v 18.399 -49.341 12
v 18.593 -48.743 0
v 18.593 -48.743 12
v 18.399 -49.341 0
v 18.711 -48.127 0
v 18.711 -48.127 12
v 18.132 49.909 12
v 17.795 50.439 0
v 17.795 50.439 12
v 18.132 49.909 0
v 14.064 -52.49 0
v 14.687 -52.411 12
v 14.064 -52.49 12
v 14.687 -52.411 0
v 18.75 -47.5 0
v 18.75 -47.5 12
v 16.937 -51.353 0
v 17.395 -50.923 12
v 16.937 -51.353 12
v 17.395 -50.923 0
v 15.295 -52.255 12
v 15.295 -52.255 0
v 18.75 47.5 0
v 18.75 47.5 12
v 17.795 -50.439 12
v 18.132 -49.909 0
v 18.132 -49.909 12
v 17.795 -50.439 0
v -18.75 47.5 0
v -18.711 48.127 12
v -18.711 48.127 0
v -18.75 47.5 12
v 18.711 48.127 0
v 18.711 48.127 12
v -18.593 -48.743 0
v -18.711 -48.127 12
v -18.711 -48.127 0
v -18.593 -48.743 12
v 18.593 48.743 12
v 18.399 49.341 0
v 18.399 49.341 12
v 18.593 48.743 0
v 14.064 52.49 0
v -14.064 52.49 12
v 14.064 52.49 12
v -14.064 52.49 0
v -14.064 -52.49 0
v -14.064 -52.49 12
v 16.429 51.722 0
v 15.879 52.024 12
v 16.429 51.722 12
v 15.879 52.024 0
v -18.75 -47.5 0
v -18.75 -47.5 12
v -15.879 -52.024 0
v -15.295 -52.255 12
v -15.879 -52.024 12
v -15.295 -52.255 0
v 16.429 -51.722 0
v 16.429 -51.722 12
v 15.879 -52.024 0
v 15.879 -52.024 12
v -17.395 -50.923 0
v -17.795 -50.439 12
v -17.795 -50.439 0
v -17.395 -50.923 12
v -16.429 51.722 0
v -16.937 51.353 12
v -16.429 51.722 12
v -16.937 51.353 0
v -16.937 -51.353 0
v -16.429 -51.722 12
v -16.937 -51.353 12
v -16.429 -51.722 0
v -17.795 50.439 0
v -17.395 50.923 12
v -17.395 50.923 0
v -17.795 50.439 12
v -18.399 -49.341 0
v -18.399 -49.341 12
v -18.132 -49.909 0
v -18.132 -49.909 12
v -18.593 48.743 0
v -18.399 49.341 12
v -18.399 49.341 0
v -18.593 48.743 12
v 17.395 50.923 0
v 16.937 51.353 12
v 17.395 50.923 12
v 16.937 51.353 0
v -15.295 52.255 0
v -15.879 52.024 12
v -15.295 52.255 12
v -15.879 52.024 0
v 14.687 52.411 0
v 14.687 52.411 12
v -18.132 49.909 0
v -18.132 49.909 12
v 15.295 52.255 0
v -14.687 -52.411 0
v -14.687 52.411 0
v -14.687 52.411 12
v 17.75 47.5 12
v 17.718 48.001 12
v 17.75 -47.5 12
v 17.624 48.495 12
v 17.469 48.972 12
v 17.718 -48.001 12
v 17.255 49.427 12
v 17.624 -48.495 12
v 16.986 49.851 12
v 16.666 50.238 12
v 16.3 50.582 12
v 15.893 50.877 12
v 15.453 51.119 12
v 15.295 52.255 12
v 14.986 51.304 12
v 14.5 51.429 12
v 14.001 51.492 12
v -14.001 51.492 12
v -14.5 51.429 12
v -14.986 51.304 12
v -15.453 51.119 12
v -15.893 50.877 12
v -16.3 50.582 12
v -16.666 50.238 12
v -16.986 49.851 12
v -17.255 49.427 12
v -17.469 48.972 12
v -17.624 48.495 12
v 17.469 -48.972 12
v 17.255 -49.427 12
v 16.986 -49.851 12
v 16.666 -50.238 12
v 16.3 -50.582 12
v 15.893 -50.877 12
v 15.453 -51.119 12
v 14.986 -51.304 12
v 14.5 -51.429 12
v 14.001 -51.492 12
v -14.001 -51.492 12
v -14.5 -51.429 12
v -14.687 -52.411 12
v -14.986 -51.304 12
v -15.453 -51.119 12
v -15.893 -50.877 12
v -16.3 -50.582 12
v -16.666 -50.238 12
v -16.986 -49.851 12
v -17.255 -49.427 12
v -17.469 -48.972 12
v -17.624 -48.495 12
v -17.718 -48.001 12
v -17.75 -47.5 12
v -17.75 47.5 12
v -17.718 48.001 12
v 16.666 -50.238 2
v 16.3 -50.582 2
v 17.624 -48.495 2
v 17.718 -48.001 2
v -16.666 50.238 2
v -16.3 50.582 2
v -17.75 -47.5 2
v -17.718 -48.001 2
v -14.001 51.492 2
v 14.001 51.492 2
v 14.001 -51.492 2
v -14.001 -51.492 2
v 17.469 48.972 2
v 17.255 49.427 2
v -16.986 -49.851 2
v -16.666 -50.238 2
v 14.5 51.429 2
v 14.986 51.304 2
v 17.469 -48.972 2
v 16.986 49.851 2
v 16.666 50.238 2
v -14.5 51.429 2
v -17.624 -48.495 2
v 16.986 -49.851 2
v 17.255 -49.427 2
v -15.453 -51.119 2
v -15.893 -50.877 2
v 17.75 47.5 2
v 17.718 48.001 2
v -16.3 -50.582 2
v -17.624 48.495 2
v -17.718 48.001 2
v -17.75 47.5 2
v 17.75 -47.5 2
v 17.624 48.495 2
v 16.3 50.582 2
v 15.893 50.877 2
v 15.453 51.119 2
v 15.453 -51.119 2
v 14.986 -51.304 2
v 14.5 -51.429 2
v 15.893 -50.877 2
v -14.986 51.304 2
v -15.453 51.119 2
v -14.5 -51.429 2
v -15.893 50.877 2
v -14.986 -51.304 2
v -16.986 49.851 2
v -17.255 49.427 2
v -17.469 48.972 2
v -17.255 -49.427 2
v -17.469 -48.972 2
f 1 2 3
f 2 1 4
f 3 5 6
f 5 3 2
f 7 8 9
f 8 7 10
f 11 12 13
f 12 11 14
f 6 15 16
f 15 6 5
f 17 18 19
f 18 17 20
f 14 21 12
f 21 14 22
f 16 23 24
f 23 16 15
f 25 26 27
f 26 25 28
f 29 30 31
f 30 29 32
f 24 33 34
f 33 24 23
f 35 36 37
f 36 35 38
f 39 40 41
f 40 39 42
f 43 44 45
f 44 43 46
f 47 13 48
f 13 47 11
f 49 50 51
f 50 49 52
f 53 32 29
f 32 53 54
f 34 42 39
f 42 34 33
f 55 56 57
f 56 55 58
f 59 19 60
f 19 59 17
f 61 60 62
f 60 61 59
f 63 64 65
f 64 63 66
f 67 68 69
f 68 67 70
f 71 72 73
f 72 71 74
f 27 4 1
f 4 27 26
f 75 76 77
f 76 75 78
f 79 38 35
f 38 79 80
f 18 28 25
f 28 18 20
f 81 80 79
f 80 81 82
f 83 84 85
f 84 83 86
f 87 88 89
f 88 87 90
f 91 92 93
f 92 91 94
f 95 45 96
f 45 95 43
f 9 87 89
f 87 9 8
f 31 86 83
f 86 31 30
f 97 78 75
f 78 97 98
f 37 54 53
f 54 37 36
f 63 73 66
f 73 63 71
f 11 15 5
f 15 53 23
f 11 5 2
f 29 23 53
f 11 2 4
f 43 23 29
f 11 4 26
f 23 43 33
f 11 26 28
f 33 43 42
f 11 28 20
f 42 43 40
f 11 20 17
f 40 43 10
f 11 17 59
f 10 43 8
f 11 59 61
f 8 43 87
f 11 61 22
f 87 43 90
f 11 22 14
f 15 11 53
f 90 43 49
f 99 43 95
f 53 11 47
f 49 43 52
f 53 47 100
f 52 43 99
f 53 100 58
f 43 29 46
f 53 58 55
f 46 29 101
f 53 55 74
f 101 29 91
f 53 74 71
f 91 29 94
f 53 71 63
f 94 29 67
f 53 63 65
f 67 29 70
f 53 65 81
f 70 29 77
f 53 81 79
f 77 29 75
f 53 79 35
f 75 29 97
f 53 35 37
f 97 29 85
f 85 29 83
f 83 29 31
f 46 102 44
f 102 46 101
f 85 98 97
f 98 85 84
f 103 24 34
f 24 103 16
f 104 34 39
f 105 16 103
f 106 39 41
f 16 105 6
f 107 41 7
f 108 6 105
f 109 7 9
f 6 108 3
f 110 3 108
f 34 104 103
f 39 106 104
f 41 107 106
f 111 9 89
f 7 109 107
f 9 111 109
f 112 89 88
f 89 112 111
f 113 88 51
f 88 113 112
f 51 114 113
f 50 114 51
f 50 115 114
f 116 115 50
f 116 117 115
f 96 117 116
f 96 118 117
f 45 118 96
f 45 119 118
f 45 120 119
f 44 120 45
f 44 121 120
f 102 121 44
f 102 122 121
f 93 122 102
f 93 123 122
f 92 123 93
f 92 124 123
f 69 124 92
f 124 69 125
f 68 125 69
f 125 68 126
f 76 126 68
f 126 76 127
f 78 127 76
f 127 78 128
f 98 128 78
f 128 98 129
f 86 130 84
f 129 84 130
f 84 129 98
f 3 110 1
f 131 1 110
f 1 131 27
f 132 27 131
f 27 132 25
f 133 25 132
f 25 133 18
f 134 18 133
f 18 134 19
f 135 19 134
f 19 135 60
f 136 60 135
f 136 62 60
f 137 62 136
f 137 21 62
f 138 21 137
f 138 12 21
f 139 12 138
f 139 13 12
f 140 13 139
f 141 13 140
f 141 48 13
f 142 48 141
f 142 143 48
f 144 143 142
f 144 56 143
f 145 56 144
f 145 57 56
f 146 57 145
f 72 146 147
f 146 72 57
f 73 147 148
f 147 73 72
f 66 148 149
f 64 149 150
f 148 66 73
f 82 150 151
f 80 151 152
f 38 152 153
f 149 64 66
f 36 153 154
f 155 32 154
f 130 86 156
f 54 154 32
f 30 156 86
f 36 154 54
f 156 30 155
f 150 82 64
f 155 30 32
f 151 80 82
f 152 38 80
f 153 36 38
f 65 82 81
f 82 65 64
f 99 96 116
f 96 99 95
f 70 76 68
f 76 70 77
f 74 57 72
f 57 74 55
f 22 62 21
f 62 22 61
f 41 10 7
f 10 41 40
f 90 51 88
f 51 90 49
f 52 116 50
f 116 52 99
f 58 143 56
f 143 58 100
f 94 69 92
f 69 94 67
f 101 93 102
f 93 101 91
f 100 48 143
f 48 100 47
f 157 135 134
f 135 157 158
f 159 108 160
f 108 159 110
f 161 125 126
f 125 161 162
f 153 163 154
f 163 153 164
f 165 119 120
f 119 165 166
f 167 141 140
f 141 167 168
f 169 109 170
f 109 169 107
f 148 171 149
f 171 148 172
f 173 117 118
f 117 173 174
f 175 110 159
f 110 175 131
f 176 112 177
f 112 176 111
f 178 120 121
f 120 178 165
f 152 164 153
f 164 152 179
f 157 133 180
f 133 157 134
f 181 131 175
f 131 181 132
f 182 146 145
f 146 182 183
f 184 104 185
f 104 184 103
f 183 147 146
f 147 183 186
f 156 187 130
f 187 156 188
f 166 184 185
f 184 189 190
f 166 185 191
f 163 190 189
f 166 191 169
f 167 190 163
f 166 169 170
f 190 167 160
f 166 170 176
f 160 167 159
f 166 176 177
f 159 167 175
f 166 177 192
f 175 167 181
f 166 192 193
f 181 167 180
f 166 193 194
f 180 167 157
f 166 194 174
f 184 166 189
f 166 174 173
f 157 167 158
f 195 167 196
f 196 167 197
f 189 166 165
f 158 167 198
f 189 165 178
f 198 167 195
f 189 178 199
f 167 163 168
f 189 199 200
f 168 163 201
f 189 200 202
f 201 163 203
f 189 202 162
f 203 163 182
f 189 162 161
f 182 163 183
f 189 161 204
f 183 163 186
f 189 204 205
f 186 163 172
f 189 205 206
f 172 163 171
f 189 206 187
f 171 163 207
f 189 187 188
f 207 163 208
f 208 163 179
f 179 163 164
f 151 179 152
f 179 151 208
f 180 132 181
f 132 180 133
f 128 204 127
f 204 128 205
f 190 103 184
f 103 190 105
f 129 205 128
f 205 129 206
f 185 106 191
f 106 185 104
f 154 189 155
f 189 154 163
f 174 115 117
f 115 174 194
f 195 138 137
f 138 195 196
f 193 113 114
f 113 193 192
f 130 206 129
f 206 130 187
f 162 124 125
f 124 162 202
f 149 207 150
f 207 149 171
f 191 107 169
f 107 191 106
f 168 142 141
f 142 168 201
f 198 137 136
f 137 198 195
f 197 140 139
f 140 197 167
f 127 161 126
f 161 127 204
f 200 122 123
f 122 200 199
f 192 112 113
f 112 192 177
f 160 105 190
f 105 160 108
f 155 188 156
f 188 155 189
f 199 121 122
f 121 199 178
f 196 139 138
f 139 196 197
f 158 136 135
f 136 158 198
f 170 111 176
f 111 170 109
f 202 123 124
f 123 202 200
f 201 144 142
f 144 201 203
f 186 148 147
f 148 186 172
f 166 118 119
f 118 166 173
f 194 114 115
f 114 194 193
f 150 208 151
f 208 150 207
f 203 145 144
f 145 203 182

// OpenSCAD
$fn = 50;


difference() {
	union() {
		hull() {
			translate(v = [-13.7500000000, 47.5000000000, 0]) {
				cylinder(h = 12, r = 5);
			}
			translate(v = [13.7500000000, 47.5000000000, 0]) {
				cylinder(h = 12, r = 5);
			}
			translate(v = [-13.7500000000, -47.5000000000, 0]) {
				cylinder(h = 12, r = 5);
			}
			translate(v = [13.7500000000, -47.5000000000, 0]) {
				cylinder(h = 12, r = 5);
			}
		}
	}
	union() {
		translate(v = [0, 0, 2]) {
			hull() {
				translate(v = [-13.7500000000, 47.5000000000, 0]) {
					cylinder(h = 10, r = 4);
				}
				translate(v = [13.7500000000, 47.5000000000, 0]) {
					cylinder(h = 10, r = 4);
				}
				translate(v = [-13.7500000000, -47.5000000000, 0]) {
					cylinder(h = 10, r = 4);
				}
				translate(v = [13.7500000000, -47.5000000000, 0]) {
					cylinder(h = 10, r = 4);
				}
			}
		}
	}
}
